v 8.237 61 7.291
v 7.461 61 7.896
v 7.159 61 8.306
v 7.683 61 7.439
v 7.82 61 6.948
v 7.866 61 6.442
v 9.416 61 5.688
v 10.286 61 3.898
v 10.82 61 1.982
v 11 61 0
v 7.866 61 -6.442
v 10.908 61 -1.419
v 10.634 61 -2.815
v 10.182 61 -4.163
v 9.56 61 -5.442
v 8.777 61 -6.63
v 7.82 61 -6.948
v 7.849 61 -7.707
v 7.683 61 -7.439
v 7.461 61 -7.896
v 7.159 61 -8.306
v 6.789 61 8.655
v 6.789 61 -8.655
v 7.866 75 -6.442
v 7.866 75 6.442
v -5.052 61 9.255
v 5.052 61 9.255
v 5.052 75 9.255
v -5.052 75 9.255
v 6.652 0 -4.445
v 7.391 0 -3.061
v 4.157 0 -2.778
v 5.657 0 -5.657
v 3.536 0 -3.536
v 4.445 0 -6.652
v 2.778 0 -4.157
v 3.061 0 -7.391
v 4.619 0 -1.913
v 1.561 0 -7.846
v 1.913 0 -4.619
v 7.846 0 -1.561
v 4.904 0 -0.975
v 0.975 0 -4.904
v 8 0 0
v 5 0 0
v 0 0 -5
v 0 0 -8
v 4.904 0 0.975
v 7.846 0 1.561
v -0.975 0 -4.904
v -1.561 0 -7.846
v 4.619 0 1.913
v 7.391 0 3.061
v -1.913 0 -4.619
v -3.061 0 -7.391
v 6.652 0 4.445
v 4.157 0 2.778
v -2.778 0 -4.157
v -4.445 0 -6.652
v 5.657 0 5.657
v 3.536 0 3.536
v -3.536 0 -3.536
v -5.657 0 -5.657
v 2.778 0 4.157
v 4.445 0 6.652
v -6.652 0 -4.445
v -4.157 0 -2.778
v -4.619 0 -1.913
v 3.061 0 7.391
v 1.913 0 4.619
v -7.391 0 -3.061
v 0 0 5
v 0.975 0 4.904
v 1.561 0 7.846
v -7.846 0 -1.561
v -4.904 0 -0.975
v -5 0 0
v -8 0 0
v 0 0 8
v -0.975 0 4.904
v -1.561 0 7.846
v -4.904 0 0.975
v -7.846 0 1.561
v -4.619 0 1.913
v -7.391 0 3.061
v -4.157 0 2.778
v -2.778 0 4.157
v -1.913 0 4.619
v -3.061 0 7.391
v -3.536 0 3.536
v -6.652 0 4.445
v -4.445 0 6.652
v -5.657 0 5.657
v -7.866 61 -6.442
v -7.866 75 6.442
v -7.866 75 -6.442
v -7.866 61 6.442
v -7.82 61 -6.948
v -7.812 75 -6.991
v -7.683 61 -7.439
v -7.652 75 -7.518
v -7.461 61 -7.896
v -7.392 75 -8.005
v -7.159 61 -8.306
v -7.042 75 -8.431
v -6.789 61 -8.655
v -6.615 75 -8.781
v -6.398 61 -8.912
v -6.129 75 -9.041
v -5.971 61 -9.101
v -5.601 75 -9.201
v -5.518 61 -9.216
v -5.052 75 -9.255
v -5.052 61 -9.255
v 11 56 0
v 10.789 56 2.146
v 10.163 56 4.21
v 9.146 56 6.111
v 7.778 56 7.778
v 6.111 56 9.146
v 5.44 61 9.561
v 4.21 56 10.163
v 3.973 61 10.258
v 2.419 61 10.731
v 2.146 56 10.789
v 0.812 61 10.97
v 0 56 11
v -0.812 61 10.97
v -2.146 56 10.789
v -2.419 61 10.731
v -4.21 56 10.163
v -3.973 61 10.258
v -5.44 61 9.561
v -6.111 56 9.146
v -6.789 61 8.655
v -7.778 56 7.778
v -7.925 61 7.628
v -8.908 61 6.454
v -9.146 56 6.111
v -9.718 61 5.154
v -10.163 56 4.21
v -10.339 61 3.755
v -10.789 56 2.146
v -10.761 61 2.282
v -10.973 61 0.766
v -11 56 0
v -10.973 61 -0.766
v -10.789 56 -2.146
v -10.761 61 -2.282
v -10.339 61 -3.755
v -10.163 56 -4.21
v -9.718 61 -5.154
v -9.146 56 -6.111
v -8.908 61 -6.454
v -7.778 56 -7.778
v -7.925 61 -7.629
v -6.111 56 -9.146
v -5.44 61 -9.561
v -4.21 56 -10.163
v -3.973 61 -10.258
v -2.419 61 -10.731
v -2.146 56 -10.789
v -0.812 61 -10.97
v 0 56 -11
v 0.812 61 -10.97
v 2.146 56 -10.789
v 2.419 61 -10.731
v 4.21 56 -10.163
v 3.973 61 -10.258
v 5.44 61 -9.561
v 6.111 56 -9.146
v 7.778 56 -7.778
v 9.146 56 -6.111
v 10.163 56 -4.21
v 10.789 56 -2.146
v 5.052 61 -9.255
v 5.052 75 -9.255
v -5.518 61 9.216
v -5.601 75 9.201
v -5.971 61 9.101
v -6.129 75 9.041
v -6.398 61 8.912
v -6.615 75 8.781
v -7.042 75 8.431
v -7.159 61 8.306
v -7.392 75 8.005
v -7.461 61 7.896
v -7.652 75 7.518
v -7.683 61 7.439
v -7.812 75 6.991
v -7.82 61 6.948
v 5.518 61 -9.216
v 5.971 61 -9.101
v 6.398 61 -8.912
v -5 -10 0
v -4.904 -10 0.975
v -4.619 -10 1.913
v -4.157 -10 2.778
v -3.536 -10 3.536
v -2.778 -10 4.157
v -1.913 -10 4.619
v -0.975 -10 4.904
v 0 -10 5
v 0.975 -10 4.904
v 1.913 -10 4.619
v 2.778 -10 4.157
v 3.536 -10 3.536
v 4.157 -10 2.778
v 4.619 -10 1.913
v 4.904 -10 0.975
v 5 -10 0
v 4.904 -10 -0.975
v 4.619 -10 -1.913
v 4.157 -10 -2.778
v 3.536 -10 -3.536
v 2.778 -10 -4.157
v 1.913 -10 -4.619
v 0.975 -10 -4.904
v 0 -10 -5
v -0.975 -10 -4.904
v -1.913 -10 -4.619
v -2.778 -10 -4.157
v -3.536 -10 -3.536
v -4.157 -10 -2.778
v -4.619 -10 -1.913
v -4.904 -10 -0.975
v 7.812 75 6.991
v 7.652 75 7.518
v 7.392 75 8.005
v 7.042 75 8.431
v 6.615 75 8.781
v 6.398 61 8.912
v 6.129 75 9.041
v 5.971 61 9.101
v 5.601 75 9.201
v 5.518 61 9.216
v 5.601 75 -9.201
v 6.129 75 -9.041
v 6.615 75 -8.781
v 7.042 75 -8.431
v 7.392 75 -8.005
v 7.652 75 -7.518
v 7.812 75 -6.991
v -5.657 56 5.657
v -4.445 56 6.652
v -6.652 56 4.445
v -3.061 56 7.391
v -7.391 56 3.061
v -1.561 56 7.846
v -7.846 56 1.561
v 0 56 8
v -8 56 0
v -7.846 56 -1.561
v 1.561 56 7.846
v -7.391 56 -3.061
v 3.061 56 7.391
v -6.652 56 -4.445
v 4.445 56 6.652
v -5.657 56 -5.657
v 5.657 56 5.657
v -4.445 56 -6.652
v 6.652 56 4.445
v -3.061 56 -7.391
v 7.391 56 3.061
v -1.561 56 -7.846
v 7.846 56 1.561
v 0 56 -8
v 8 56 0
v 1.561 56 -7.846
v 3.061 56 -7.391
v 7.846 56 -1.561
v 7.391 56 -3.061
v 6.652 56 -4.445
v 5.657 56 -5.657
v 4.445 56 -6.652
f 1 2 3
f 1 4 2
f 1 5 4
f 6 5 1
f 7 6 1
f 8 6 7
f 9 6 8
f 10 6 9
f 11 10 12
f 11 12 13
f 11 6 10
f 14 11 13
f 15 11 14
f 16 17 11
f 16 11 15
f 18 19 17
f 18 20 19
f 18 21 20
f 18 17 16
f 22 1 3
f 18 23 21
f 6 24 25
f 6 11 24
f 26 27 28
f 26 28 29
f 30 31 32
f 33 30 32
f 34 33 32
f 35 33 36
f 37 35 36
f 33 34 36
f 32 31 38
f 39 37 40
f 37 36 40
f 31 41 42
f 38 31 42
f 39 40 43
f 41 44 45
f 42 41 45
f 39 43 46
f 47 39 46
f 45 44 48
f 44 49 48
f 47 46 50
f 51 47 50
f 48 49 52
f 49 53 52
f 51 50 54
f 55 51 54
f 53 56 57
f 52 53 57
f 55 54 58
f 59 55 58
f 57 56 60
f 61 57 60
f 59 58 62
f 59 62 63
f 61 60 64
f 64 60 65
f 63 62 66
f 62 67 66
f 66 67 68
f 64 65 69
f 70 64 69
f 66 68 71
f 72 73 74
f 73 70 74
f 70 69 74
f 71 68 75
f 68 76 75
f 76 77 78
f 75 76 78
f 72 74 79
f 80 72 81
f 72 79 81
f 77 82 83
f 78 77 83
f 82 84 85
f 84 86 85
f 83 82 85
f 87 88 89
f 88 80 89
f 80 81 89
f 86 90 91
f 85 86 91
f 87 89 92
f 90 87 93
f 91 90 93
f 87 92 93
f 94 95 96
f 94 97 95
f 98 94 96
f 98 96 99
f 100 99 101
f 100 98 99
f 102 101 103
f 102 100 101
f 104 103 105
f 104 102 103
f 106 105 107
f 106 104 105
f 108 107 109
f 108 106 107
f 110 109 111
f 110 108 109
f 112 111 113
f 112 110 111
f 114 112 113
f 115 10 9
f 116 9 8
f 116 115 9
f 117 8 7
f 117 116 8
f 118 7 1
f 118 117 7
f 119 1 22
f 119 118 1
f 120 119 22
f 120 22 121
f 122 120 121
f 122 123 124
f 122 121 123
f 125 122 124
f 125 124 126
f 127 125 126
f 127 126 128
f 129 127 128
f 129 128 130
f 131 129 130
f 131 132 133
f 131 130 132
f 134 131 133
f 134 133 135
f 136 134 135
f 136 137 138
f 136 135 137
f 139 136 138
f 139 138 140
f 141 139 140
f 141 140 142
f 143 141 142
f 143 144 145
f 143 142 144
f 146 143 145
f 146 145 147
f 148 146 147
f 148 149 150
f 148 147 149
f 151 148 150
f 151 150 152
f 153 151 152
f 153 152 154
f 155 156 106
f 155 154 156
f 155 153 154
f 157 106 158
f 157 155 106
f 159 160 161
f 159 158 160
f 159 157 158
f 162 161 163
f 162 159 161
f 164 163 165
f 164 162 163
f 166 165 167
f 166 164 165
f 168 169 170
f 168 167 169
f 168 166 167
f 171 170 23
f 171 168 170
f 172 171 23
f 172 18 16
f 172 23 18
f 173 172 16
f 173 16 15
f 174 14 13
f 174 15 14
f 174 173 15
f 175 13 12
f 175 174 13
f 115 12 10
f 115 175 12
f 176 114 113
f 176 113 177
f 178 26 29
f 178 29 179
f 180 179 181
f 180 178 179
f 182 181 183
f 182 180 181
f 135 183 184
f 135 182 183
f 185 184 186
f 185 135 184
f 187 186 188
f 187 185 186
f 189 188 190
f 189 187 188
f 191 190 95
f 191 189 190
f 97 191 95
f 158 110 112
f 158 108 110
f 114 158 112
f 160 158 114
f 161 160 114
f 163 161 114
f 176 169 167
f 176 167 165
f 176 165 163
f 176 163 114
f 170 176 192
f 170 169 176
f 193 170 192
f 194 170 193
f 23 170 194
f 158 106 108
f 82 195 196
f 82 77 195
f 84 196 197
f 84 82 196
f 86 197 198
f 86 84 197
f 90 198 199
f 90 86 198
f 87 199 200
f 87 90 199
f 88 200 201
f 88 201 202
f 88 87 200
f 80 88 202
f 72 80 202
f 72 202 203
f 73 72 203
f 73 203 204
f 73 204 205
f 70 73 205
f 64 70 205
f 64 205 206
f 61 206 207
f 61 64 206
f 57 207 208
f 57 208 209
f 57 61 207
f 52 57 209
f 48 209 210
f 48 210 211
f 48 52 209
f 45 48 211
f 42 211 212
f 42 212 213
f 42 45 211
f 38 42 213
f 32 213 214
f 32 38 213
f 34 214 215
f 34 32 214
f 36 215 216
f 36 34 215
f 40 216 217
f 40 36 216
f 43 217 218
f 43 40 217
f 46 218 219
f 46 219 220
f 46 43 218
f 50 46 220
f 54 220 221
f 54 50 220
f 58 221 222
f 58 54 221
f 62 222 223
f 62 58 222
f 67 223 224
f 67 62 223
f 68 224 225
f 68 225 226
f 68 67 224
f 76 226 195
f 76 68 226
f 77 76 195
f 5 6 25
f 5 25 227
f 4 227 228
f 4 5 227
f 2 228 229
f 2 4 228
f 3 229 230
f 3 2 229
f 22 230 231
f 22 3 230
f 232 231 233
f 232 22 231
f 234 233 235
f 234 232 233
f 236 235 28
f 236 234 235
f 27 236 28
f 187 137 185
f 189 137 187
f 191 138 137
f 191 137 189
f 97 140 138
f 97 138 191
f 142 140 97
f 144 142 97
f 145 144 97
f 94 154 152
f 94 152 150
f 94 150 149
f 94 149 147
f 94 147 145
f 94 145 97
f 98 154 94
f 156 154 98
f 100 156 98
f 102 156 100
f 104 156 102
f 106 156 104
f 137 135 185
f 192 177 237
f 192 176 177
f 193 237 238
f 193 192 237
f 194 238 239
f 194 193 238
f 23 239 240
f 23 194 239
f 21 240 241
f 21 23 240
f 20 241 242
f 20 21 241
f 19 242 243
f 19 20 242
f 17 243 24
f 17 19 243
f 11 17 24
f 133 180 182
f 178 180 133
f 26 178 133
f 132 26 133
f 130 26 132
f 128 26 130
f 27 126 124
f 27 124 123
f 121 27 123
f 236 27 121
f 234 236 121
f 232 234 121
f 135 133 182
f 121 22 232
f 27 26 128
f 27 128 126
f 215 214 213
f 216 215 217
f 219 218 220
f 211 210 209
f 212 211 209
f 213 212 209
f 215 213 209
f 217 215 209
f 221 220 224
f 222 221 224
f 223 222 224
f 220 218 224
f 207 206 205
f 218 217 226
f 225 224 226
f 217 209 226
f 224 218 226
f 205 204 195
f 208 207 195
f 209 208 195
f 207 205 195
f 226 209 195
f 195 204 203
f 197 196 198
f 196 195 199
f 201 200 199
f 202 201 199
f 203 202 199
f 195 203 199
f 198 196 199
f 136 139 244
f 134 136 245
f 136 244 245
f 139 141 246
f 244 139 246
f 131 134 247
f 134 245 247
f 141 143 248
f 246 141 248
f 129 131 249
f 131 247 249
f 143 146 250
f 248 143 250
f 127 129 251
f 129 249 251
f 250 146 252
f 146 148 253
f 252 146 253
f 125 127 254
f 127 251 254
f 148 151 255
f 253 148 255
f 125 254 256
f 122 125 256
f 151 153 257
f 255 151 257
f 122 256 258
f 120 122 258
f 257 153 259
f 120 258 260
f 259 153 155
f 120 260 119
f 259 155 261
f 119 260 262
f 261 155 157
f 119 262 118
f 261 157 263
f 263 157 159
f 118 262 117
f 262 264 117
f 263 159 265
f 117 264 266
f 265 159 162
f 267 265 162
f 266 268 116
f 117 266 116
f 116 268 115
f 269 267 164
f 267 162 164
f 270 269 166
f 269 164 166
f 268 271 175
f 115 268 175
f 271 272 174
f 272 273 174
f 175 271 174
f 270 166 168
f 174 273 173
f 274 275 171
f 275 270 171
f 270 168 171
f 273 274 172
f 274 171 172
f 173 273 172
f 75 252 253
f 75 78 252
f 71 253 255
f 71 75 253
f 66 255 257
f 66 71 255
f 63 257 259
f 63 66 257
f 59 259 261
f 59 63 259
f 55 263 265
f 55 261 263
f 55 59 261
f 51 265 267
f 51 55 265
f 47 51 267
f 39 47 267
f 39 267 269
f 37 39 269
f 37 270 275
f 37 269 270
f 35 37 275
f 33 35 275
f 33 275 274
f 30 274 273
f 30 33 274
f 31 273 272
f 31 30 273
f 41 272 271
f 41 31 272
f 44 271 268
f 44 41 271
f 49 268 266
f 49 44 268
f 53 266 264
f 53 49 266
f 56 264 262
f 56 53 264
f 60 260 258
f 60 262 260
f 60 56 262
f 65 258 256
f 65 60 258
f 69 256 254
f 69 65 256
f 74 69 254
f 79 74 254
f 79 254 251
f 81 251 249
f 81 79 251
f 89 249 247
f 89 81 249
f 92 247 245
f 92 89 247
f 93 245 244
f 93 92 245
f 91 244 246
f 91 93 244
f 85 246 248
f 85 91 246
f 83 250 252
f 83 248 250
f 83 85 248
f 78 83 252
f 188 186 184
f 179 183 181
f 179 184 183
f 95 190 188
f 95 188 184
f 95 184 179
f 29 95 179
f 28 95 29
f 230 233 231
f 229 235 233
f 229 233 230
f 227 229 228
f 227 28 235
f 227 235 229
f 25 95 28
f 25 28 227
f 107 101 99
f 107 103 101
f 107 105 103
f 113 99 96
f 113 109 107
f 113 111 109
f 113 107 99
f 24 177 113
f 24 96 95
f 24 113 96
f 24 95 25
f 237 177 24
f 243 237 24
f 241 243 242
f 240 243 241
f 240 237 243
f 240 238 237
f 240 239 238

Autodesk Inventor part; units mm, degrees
ref_plane "YZ Plane" through (0, 0, 0) normal (1, 0, 0) x (0, 1, 0)
ref_plane "XZ Plane" through (0, 0, 0) normal (0, 1, 0) x (-1, 0, 0)
ref_plane "XY Plane" through (0, 0, 0) normal (0, 0, 1) x (1, 0, 0)
sketch "Sketch1" plane through (0, 0, 0) normal (0, 1, 0) x (-1, 0, 0)
  circle A0 centre (0, 0) radius 8
  circle A1 centre (0, 0) radius 5
  dimension "d0" = 16
  dimension "d1" = 10
extrude "Extrusion1" add sketch "Sketch1" along normal blind 56 contours A0 | A1
extrude "Extrusion2" add sketch "Sketch1" against normal blind 10 contours A1
sketch "Sketch2" plane through (0, 56, 0) normal (0, 1, 0) x (1, 0, 0)
  circle A0 centre (0, 0) radius 11
  dimension "d6" = 22
extrude "Extrusion3" add sketch "Sketch2" along normal blind 5
sketch "Sketch3" plane through (0, 61, 0) normal (0, 1, 0) x (1, 0, 0)
  circle A0 centre (0, 0) radius 11 projected
  line L0 (-5.0525, -8.4417) -> (5.0525, -8.4417) construction
  line L1 (7.0525, -6.4417) -> (7.0525, 6.4417) construction
  line L2 (5.0525, 8.4417) -> (-5.0525, 8.4417) construction
  line L3 (-7.0525, 6.4417) -> (-7.0525, -6.4417) construction
  line L4 (-7.0525, -8.4417) -> (7.0525, 8.4417) construction
  line L5 (7.0525, -8.4417) -> (-7.0525, 8.4417) construction
  arc A1 (7.0525, 6.4417) -> (5.0525, 8.4417) centre (5.0525, 6.4417) ccw construction
  arc A2 (5.0525, -8.4417) -> (7.0525, -6.4417) centre (5.0525, -6.4417) ccw construction
  arc A3 (-7.0525, -6.4417) -> (-5.0525, -8.4417) centre (-5.0525, -6.4417) ccw construction
  arc A4 (-5.0525, 8.4417) -> (-7.0525, 6.4417) centre (-5.0525, 6.4417) ccw construction
  line L6 (7.8658, 6.4417) -> (7.8658, -6.4417)
  arc A5 (5.0525, -9.2549) -> (7.8658, -6.4417) centre (5.0525, -6.4417) ccw
  line L7 (5.0525, -9.2549) -> (-5.0525, -9.2549)
  arc A6 (-7.8658, -6.4417) -> (-5.0525, -9.2549) centre (-5.0525, -6.4417) ccw
  line L8 (-7.8658, -6.4417) -> (-7.8658, 6.4417)
  arc A7 (-5.0525, 9.2549) -> (-7.8658, 6.4417) centre (-5.0525, 6.4417) ccw
  line L9 (-5.0525, 9.2549) -> (5.0525, 9.2549)
  arc A8 (7.8658, 6.4417) -> (5.0525, 9.2549) centre (5.0525, 6.4417) ccw
  dimension "d9" = 2
extrude "Extrusion4" add sketch "Sketch3" along normal blind 14 contours A8 L6 A5 L7 A6 L8 A7 L9
thread "Thread1" size "M16x2" class "6g" standard "ANSI Metric M Profile" length 56
properties part number "SetScrew"
